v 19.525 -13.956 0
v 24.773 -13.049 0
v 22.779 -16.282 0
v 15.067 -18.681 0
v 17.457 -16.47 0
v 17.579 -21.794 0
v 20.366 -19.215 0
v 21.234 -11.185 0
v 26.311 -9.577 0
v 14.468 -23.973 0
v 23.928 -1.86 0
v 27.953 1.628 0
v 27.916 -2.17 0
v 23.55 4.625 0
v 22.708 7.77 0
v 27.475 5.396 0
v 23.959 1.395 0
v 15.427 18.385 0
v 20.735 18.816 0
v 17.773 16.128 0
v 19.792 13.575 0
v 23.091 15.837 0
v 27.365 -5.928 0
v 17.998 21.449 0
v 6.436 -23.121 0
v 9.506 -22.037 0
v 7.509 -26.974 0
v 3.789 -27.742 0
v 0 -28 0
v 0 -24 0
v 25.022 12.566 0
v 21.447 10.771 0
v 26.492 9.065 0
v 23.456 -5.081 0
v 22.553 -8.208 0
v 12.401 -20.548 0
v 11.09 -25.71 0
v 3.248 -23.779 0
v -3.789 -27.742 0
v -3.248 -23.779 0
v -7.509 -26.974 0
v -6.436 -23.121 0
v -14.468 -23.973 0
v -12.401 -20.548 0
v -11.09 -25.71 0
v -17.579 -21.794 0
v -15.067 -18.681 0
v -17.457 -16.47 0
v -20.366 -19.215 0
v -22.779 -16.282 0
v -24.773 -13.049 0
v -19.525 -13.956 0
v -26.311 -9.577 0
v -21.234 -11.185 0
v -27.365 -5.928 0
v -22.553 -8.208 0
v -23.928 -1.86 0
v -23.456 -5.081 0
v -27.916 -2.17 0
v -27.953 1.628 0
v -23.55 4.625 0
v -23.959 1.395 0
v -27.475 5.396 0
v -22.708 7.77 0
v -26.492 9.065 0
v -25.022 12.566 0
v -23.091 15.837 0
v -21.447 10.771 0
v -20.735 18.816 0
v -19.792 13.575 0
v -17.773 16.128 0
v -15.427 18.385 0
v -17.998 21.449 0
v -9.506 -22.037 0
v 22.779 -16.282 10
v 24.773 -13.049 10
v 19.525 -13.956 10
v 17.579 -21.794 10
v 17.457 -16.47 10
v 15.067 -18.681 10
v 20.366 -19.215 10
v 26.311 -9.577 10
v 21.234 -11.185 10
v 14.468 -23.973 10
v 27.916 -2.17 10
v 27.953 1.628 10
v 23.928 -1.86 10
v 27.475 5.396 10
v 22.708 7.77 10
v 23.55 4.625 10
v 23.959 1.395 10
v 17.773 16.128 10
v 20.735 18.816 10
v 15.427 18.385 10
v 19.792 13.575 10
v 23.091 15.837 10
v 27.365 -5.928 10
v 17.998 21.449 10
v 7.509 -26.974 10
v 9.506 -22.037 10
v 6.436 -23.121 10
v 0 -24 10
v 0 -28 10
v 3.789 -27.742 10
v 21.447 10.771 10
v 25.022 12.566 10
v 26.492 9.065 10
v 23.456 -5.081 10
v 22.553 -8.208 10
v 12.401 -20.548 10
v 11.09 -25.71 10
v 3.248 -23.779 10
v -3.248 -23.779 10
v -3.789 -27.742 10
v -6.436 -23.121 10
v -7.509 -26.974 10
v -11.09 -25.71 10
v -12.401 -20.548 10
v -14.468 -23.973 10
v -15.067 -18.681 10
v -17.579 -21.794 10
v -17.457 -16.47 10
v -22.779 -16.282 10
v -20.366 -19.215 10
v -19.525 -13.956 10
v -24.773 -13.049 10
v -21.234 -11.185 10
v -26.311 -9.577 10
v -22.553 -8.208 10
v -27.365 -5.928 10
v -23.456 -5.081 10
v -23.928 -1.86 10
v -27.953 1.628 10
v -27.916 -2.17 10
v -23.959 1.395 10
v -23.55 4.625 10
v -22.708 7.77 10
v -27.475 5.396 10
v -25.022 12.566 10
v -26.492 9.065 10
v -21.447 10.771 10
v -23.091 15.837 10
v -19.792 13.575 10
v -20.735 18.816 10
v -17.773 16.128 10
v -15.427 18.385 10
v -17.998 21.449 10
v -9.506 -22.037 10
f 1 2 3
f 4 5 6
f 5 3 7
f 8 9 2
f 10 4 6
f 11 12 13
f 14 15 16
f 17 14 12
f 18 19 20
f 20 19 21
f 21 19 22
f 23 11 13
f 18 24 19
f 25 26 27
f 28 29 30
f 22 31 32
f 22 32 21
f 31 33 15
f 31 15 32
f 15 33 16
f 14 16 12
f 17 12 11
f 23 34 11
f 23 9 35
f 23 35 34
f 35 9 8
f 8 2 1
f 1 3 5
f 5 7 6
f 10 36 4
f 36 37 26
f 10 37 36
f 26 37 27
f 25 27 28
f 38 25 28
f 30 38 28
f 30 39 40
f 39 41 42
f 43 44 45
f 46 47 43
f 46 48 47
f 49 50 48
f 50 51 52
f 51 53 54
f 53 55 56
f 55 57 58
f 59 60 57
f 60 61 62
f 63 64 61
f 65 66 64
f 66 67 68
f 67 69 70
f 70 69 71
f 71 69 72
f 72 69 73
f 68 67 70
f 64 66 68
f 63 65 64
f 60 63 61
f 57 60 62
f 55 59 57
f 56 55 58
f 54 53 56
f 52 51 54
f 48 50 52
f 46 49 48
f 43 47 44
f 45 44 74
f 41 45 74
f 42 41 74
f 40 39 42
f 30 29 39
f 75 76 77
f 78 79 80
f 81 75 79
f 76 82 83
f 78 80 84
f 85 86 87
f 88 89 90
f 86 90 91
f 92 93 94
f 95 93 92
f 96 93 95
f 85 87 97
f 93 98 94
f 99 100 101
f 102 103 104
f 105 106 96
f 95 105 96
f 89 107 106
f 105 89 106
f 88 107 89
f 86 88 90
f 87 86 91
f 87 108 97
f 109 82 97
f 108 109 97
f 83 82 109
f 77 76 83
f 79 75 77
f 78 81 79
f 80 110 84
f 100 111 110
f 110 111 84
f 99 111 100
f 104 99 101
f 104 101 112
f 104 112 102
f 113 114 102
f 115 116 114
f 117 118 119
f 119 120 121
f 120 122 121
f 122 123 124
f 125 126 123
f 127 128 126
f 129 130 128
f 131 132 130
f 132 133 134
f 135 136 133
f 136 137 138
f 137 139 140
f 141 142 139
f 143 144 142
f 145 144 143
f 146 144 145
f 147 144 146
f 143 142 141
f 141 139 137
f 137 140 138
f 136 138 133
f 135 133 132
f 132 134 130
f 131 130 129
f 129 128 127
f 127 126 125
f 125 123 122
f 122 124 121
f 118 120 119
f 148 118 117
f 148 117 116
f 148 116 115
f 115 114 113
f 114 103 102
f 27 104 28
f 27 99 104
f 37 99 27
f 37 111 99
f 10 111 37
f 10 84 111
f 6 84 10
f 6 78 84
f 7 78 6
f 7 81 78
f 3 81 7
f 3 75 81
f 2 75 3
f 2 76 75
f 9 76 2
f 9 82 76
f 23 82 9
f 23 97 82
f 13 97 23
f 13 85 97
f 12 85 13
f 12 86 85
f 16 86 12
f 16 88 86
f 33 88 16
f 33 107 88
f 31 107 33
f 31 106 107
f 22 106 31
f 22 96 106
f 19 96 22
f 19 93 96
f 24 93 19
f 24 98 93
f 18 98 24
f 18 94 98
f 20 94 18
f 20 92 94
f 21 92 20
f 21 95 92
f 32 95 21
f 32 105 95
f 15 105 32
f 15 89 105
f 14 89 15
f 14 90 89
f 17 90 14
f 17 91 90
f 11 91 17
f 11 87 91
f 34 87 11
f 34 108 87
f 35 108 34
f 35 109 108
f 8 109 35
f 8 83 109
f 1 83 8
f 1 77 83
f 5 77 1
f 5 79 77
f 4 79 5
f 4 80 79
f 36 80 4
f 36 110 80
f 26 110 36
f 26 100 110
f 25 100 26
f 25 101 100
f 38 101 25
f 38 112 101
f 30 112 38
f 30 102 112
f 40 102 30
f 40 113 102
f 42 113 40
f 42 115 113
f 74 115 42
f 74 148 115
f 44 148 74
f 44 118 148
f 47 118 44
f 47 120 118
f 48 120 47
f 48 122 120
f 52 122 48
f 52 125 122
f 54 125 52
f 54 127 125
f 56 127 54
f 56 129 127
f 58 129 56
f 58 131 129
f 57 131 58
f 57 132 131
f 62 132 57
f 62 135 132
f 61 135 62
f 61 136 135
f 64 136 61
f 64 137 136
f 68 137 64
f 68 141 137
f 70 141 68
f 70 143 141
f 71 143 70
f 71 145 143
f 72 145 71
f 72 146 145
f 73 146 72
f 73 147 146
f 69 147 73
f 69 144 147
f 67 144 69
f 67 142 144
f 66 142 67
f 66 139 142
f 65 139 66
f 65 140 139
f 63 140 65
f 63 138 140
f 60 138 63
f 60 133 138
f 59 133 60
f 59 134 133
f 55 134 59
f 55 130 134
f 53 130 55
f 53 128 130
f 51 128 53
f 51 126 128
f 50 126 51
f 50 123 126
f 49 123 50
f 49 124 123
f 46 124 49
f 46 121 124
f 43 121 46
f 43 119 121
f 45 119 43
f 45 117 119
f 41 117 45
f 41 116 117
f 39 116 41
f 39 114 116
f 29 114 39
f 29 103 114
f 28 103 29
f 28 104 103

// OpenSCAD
$fn = 32;

// ----------------------------------------------------------------------
// Spring clip: 56 mm outside, 4 mm band, 80 degree opening
// ----------------------------------------------------------------------

// --- parameters (mm) ---
outer_r = 28;             // clip outside radius
inner_r = 24;             // clip bore radius
band = 4;                 // band thickness
clip_w = 10;              // clip width
opening = 80;             // opening angle

clip_profile = [[-17.998, 21.449], [-20.735, 18.816], [-23.091, 15.837], [-25.022, 12.566], [-26.492, 9.065], [-27.475, 5.396], [-27.953, 1.628], [-27.916, -2.17], [-27.365, -5.928], [-26.311, -9.577], [-24.773, -13.049], [-22.779, -16.282], [-20.366, -19.215], [-17.579, -21.794], [-14.468, -23.973], [-11.09, -25.71], [-7.509, -26.974], [-3.789, -27.742], [0, -28], [3.789, -27.742], [7.509, -26.974], [11.09, -25.71], [14.468, -23.973], [17.579, -21.794], [20.366, -19.215], [22.779, -16.282], [24.773, -13.049], [26.311, -9.577], [27.365, -5.928], [27.916, -2.17], [27.953, 1.628], [27.475, 5.396], [26.492, 9.065], [25.022, 12.566], [23.091, 15.837], [20.735, 18.816], [17.998, 21.449], [15.427, 18.385], [17.773, 16.128], [19.792, 13.575], [21.447, 10.771], [22.708, 7.77], [23.55, 4.625], [23.959, 1.395], [23.928, -1.86], [23.456, -5.081], [22.553, -8.208], [21.234, -11.185], [19.525, -13.956], [17.457, -16.47], [15.067, -18.681], [12.401, -20.548], [9.506, -22.037], [6.436, -23.121], [3.248, -23.779], [0, -24], [-3.248, -23.779], [-6.436, -23.121], [-9.506, -22.037], [-12.401, -20.548], [-15.067, -18.681], [-17.457, -16.47], [-19.525, -13.956], [-21.234, -11.185], [-22.553, -8.208], [-23.456, -5.081], [-23.928, -1.86], [-23.959, 1.395], [-23.55, 4.625], [-22.708, 7.77], [-21.447, 10.771], [-19.792, 13.575], [-17.773, 16.128], [-15.427, 18.385]];

difference() {
  union() {
    linear_extrude(height = clip_w) polygon(clip_profile);
  }
}
